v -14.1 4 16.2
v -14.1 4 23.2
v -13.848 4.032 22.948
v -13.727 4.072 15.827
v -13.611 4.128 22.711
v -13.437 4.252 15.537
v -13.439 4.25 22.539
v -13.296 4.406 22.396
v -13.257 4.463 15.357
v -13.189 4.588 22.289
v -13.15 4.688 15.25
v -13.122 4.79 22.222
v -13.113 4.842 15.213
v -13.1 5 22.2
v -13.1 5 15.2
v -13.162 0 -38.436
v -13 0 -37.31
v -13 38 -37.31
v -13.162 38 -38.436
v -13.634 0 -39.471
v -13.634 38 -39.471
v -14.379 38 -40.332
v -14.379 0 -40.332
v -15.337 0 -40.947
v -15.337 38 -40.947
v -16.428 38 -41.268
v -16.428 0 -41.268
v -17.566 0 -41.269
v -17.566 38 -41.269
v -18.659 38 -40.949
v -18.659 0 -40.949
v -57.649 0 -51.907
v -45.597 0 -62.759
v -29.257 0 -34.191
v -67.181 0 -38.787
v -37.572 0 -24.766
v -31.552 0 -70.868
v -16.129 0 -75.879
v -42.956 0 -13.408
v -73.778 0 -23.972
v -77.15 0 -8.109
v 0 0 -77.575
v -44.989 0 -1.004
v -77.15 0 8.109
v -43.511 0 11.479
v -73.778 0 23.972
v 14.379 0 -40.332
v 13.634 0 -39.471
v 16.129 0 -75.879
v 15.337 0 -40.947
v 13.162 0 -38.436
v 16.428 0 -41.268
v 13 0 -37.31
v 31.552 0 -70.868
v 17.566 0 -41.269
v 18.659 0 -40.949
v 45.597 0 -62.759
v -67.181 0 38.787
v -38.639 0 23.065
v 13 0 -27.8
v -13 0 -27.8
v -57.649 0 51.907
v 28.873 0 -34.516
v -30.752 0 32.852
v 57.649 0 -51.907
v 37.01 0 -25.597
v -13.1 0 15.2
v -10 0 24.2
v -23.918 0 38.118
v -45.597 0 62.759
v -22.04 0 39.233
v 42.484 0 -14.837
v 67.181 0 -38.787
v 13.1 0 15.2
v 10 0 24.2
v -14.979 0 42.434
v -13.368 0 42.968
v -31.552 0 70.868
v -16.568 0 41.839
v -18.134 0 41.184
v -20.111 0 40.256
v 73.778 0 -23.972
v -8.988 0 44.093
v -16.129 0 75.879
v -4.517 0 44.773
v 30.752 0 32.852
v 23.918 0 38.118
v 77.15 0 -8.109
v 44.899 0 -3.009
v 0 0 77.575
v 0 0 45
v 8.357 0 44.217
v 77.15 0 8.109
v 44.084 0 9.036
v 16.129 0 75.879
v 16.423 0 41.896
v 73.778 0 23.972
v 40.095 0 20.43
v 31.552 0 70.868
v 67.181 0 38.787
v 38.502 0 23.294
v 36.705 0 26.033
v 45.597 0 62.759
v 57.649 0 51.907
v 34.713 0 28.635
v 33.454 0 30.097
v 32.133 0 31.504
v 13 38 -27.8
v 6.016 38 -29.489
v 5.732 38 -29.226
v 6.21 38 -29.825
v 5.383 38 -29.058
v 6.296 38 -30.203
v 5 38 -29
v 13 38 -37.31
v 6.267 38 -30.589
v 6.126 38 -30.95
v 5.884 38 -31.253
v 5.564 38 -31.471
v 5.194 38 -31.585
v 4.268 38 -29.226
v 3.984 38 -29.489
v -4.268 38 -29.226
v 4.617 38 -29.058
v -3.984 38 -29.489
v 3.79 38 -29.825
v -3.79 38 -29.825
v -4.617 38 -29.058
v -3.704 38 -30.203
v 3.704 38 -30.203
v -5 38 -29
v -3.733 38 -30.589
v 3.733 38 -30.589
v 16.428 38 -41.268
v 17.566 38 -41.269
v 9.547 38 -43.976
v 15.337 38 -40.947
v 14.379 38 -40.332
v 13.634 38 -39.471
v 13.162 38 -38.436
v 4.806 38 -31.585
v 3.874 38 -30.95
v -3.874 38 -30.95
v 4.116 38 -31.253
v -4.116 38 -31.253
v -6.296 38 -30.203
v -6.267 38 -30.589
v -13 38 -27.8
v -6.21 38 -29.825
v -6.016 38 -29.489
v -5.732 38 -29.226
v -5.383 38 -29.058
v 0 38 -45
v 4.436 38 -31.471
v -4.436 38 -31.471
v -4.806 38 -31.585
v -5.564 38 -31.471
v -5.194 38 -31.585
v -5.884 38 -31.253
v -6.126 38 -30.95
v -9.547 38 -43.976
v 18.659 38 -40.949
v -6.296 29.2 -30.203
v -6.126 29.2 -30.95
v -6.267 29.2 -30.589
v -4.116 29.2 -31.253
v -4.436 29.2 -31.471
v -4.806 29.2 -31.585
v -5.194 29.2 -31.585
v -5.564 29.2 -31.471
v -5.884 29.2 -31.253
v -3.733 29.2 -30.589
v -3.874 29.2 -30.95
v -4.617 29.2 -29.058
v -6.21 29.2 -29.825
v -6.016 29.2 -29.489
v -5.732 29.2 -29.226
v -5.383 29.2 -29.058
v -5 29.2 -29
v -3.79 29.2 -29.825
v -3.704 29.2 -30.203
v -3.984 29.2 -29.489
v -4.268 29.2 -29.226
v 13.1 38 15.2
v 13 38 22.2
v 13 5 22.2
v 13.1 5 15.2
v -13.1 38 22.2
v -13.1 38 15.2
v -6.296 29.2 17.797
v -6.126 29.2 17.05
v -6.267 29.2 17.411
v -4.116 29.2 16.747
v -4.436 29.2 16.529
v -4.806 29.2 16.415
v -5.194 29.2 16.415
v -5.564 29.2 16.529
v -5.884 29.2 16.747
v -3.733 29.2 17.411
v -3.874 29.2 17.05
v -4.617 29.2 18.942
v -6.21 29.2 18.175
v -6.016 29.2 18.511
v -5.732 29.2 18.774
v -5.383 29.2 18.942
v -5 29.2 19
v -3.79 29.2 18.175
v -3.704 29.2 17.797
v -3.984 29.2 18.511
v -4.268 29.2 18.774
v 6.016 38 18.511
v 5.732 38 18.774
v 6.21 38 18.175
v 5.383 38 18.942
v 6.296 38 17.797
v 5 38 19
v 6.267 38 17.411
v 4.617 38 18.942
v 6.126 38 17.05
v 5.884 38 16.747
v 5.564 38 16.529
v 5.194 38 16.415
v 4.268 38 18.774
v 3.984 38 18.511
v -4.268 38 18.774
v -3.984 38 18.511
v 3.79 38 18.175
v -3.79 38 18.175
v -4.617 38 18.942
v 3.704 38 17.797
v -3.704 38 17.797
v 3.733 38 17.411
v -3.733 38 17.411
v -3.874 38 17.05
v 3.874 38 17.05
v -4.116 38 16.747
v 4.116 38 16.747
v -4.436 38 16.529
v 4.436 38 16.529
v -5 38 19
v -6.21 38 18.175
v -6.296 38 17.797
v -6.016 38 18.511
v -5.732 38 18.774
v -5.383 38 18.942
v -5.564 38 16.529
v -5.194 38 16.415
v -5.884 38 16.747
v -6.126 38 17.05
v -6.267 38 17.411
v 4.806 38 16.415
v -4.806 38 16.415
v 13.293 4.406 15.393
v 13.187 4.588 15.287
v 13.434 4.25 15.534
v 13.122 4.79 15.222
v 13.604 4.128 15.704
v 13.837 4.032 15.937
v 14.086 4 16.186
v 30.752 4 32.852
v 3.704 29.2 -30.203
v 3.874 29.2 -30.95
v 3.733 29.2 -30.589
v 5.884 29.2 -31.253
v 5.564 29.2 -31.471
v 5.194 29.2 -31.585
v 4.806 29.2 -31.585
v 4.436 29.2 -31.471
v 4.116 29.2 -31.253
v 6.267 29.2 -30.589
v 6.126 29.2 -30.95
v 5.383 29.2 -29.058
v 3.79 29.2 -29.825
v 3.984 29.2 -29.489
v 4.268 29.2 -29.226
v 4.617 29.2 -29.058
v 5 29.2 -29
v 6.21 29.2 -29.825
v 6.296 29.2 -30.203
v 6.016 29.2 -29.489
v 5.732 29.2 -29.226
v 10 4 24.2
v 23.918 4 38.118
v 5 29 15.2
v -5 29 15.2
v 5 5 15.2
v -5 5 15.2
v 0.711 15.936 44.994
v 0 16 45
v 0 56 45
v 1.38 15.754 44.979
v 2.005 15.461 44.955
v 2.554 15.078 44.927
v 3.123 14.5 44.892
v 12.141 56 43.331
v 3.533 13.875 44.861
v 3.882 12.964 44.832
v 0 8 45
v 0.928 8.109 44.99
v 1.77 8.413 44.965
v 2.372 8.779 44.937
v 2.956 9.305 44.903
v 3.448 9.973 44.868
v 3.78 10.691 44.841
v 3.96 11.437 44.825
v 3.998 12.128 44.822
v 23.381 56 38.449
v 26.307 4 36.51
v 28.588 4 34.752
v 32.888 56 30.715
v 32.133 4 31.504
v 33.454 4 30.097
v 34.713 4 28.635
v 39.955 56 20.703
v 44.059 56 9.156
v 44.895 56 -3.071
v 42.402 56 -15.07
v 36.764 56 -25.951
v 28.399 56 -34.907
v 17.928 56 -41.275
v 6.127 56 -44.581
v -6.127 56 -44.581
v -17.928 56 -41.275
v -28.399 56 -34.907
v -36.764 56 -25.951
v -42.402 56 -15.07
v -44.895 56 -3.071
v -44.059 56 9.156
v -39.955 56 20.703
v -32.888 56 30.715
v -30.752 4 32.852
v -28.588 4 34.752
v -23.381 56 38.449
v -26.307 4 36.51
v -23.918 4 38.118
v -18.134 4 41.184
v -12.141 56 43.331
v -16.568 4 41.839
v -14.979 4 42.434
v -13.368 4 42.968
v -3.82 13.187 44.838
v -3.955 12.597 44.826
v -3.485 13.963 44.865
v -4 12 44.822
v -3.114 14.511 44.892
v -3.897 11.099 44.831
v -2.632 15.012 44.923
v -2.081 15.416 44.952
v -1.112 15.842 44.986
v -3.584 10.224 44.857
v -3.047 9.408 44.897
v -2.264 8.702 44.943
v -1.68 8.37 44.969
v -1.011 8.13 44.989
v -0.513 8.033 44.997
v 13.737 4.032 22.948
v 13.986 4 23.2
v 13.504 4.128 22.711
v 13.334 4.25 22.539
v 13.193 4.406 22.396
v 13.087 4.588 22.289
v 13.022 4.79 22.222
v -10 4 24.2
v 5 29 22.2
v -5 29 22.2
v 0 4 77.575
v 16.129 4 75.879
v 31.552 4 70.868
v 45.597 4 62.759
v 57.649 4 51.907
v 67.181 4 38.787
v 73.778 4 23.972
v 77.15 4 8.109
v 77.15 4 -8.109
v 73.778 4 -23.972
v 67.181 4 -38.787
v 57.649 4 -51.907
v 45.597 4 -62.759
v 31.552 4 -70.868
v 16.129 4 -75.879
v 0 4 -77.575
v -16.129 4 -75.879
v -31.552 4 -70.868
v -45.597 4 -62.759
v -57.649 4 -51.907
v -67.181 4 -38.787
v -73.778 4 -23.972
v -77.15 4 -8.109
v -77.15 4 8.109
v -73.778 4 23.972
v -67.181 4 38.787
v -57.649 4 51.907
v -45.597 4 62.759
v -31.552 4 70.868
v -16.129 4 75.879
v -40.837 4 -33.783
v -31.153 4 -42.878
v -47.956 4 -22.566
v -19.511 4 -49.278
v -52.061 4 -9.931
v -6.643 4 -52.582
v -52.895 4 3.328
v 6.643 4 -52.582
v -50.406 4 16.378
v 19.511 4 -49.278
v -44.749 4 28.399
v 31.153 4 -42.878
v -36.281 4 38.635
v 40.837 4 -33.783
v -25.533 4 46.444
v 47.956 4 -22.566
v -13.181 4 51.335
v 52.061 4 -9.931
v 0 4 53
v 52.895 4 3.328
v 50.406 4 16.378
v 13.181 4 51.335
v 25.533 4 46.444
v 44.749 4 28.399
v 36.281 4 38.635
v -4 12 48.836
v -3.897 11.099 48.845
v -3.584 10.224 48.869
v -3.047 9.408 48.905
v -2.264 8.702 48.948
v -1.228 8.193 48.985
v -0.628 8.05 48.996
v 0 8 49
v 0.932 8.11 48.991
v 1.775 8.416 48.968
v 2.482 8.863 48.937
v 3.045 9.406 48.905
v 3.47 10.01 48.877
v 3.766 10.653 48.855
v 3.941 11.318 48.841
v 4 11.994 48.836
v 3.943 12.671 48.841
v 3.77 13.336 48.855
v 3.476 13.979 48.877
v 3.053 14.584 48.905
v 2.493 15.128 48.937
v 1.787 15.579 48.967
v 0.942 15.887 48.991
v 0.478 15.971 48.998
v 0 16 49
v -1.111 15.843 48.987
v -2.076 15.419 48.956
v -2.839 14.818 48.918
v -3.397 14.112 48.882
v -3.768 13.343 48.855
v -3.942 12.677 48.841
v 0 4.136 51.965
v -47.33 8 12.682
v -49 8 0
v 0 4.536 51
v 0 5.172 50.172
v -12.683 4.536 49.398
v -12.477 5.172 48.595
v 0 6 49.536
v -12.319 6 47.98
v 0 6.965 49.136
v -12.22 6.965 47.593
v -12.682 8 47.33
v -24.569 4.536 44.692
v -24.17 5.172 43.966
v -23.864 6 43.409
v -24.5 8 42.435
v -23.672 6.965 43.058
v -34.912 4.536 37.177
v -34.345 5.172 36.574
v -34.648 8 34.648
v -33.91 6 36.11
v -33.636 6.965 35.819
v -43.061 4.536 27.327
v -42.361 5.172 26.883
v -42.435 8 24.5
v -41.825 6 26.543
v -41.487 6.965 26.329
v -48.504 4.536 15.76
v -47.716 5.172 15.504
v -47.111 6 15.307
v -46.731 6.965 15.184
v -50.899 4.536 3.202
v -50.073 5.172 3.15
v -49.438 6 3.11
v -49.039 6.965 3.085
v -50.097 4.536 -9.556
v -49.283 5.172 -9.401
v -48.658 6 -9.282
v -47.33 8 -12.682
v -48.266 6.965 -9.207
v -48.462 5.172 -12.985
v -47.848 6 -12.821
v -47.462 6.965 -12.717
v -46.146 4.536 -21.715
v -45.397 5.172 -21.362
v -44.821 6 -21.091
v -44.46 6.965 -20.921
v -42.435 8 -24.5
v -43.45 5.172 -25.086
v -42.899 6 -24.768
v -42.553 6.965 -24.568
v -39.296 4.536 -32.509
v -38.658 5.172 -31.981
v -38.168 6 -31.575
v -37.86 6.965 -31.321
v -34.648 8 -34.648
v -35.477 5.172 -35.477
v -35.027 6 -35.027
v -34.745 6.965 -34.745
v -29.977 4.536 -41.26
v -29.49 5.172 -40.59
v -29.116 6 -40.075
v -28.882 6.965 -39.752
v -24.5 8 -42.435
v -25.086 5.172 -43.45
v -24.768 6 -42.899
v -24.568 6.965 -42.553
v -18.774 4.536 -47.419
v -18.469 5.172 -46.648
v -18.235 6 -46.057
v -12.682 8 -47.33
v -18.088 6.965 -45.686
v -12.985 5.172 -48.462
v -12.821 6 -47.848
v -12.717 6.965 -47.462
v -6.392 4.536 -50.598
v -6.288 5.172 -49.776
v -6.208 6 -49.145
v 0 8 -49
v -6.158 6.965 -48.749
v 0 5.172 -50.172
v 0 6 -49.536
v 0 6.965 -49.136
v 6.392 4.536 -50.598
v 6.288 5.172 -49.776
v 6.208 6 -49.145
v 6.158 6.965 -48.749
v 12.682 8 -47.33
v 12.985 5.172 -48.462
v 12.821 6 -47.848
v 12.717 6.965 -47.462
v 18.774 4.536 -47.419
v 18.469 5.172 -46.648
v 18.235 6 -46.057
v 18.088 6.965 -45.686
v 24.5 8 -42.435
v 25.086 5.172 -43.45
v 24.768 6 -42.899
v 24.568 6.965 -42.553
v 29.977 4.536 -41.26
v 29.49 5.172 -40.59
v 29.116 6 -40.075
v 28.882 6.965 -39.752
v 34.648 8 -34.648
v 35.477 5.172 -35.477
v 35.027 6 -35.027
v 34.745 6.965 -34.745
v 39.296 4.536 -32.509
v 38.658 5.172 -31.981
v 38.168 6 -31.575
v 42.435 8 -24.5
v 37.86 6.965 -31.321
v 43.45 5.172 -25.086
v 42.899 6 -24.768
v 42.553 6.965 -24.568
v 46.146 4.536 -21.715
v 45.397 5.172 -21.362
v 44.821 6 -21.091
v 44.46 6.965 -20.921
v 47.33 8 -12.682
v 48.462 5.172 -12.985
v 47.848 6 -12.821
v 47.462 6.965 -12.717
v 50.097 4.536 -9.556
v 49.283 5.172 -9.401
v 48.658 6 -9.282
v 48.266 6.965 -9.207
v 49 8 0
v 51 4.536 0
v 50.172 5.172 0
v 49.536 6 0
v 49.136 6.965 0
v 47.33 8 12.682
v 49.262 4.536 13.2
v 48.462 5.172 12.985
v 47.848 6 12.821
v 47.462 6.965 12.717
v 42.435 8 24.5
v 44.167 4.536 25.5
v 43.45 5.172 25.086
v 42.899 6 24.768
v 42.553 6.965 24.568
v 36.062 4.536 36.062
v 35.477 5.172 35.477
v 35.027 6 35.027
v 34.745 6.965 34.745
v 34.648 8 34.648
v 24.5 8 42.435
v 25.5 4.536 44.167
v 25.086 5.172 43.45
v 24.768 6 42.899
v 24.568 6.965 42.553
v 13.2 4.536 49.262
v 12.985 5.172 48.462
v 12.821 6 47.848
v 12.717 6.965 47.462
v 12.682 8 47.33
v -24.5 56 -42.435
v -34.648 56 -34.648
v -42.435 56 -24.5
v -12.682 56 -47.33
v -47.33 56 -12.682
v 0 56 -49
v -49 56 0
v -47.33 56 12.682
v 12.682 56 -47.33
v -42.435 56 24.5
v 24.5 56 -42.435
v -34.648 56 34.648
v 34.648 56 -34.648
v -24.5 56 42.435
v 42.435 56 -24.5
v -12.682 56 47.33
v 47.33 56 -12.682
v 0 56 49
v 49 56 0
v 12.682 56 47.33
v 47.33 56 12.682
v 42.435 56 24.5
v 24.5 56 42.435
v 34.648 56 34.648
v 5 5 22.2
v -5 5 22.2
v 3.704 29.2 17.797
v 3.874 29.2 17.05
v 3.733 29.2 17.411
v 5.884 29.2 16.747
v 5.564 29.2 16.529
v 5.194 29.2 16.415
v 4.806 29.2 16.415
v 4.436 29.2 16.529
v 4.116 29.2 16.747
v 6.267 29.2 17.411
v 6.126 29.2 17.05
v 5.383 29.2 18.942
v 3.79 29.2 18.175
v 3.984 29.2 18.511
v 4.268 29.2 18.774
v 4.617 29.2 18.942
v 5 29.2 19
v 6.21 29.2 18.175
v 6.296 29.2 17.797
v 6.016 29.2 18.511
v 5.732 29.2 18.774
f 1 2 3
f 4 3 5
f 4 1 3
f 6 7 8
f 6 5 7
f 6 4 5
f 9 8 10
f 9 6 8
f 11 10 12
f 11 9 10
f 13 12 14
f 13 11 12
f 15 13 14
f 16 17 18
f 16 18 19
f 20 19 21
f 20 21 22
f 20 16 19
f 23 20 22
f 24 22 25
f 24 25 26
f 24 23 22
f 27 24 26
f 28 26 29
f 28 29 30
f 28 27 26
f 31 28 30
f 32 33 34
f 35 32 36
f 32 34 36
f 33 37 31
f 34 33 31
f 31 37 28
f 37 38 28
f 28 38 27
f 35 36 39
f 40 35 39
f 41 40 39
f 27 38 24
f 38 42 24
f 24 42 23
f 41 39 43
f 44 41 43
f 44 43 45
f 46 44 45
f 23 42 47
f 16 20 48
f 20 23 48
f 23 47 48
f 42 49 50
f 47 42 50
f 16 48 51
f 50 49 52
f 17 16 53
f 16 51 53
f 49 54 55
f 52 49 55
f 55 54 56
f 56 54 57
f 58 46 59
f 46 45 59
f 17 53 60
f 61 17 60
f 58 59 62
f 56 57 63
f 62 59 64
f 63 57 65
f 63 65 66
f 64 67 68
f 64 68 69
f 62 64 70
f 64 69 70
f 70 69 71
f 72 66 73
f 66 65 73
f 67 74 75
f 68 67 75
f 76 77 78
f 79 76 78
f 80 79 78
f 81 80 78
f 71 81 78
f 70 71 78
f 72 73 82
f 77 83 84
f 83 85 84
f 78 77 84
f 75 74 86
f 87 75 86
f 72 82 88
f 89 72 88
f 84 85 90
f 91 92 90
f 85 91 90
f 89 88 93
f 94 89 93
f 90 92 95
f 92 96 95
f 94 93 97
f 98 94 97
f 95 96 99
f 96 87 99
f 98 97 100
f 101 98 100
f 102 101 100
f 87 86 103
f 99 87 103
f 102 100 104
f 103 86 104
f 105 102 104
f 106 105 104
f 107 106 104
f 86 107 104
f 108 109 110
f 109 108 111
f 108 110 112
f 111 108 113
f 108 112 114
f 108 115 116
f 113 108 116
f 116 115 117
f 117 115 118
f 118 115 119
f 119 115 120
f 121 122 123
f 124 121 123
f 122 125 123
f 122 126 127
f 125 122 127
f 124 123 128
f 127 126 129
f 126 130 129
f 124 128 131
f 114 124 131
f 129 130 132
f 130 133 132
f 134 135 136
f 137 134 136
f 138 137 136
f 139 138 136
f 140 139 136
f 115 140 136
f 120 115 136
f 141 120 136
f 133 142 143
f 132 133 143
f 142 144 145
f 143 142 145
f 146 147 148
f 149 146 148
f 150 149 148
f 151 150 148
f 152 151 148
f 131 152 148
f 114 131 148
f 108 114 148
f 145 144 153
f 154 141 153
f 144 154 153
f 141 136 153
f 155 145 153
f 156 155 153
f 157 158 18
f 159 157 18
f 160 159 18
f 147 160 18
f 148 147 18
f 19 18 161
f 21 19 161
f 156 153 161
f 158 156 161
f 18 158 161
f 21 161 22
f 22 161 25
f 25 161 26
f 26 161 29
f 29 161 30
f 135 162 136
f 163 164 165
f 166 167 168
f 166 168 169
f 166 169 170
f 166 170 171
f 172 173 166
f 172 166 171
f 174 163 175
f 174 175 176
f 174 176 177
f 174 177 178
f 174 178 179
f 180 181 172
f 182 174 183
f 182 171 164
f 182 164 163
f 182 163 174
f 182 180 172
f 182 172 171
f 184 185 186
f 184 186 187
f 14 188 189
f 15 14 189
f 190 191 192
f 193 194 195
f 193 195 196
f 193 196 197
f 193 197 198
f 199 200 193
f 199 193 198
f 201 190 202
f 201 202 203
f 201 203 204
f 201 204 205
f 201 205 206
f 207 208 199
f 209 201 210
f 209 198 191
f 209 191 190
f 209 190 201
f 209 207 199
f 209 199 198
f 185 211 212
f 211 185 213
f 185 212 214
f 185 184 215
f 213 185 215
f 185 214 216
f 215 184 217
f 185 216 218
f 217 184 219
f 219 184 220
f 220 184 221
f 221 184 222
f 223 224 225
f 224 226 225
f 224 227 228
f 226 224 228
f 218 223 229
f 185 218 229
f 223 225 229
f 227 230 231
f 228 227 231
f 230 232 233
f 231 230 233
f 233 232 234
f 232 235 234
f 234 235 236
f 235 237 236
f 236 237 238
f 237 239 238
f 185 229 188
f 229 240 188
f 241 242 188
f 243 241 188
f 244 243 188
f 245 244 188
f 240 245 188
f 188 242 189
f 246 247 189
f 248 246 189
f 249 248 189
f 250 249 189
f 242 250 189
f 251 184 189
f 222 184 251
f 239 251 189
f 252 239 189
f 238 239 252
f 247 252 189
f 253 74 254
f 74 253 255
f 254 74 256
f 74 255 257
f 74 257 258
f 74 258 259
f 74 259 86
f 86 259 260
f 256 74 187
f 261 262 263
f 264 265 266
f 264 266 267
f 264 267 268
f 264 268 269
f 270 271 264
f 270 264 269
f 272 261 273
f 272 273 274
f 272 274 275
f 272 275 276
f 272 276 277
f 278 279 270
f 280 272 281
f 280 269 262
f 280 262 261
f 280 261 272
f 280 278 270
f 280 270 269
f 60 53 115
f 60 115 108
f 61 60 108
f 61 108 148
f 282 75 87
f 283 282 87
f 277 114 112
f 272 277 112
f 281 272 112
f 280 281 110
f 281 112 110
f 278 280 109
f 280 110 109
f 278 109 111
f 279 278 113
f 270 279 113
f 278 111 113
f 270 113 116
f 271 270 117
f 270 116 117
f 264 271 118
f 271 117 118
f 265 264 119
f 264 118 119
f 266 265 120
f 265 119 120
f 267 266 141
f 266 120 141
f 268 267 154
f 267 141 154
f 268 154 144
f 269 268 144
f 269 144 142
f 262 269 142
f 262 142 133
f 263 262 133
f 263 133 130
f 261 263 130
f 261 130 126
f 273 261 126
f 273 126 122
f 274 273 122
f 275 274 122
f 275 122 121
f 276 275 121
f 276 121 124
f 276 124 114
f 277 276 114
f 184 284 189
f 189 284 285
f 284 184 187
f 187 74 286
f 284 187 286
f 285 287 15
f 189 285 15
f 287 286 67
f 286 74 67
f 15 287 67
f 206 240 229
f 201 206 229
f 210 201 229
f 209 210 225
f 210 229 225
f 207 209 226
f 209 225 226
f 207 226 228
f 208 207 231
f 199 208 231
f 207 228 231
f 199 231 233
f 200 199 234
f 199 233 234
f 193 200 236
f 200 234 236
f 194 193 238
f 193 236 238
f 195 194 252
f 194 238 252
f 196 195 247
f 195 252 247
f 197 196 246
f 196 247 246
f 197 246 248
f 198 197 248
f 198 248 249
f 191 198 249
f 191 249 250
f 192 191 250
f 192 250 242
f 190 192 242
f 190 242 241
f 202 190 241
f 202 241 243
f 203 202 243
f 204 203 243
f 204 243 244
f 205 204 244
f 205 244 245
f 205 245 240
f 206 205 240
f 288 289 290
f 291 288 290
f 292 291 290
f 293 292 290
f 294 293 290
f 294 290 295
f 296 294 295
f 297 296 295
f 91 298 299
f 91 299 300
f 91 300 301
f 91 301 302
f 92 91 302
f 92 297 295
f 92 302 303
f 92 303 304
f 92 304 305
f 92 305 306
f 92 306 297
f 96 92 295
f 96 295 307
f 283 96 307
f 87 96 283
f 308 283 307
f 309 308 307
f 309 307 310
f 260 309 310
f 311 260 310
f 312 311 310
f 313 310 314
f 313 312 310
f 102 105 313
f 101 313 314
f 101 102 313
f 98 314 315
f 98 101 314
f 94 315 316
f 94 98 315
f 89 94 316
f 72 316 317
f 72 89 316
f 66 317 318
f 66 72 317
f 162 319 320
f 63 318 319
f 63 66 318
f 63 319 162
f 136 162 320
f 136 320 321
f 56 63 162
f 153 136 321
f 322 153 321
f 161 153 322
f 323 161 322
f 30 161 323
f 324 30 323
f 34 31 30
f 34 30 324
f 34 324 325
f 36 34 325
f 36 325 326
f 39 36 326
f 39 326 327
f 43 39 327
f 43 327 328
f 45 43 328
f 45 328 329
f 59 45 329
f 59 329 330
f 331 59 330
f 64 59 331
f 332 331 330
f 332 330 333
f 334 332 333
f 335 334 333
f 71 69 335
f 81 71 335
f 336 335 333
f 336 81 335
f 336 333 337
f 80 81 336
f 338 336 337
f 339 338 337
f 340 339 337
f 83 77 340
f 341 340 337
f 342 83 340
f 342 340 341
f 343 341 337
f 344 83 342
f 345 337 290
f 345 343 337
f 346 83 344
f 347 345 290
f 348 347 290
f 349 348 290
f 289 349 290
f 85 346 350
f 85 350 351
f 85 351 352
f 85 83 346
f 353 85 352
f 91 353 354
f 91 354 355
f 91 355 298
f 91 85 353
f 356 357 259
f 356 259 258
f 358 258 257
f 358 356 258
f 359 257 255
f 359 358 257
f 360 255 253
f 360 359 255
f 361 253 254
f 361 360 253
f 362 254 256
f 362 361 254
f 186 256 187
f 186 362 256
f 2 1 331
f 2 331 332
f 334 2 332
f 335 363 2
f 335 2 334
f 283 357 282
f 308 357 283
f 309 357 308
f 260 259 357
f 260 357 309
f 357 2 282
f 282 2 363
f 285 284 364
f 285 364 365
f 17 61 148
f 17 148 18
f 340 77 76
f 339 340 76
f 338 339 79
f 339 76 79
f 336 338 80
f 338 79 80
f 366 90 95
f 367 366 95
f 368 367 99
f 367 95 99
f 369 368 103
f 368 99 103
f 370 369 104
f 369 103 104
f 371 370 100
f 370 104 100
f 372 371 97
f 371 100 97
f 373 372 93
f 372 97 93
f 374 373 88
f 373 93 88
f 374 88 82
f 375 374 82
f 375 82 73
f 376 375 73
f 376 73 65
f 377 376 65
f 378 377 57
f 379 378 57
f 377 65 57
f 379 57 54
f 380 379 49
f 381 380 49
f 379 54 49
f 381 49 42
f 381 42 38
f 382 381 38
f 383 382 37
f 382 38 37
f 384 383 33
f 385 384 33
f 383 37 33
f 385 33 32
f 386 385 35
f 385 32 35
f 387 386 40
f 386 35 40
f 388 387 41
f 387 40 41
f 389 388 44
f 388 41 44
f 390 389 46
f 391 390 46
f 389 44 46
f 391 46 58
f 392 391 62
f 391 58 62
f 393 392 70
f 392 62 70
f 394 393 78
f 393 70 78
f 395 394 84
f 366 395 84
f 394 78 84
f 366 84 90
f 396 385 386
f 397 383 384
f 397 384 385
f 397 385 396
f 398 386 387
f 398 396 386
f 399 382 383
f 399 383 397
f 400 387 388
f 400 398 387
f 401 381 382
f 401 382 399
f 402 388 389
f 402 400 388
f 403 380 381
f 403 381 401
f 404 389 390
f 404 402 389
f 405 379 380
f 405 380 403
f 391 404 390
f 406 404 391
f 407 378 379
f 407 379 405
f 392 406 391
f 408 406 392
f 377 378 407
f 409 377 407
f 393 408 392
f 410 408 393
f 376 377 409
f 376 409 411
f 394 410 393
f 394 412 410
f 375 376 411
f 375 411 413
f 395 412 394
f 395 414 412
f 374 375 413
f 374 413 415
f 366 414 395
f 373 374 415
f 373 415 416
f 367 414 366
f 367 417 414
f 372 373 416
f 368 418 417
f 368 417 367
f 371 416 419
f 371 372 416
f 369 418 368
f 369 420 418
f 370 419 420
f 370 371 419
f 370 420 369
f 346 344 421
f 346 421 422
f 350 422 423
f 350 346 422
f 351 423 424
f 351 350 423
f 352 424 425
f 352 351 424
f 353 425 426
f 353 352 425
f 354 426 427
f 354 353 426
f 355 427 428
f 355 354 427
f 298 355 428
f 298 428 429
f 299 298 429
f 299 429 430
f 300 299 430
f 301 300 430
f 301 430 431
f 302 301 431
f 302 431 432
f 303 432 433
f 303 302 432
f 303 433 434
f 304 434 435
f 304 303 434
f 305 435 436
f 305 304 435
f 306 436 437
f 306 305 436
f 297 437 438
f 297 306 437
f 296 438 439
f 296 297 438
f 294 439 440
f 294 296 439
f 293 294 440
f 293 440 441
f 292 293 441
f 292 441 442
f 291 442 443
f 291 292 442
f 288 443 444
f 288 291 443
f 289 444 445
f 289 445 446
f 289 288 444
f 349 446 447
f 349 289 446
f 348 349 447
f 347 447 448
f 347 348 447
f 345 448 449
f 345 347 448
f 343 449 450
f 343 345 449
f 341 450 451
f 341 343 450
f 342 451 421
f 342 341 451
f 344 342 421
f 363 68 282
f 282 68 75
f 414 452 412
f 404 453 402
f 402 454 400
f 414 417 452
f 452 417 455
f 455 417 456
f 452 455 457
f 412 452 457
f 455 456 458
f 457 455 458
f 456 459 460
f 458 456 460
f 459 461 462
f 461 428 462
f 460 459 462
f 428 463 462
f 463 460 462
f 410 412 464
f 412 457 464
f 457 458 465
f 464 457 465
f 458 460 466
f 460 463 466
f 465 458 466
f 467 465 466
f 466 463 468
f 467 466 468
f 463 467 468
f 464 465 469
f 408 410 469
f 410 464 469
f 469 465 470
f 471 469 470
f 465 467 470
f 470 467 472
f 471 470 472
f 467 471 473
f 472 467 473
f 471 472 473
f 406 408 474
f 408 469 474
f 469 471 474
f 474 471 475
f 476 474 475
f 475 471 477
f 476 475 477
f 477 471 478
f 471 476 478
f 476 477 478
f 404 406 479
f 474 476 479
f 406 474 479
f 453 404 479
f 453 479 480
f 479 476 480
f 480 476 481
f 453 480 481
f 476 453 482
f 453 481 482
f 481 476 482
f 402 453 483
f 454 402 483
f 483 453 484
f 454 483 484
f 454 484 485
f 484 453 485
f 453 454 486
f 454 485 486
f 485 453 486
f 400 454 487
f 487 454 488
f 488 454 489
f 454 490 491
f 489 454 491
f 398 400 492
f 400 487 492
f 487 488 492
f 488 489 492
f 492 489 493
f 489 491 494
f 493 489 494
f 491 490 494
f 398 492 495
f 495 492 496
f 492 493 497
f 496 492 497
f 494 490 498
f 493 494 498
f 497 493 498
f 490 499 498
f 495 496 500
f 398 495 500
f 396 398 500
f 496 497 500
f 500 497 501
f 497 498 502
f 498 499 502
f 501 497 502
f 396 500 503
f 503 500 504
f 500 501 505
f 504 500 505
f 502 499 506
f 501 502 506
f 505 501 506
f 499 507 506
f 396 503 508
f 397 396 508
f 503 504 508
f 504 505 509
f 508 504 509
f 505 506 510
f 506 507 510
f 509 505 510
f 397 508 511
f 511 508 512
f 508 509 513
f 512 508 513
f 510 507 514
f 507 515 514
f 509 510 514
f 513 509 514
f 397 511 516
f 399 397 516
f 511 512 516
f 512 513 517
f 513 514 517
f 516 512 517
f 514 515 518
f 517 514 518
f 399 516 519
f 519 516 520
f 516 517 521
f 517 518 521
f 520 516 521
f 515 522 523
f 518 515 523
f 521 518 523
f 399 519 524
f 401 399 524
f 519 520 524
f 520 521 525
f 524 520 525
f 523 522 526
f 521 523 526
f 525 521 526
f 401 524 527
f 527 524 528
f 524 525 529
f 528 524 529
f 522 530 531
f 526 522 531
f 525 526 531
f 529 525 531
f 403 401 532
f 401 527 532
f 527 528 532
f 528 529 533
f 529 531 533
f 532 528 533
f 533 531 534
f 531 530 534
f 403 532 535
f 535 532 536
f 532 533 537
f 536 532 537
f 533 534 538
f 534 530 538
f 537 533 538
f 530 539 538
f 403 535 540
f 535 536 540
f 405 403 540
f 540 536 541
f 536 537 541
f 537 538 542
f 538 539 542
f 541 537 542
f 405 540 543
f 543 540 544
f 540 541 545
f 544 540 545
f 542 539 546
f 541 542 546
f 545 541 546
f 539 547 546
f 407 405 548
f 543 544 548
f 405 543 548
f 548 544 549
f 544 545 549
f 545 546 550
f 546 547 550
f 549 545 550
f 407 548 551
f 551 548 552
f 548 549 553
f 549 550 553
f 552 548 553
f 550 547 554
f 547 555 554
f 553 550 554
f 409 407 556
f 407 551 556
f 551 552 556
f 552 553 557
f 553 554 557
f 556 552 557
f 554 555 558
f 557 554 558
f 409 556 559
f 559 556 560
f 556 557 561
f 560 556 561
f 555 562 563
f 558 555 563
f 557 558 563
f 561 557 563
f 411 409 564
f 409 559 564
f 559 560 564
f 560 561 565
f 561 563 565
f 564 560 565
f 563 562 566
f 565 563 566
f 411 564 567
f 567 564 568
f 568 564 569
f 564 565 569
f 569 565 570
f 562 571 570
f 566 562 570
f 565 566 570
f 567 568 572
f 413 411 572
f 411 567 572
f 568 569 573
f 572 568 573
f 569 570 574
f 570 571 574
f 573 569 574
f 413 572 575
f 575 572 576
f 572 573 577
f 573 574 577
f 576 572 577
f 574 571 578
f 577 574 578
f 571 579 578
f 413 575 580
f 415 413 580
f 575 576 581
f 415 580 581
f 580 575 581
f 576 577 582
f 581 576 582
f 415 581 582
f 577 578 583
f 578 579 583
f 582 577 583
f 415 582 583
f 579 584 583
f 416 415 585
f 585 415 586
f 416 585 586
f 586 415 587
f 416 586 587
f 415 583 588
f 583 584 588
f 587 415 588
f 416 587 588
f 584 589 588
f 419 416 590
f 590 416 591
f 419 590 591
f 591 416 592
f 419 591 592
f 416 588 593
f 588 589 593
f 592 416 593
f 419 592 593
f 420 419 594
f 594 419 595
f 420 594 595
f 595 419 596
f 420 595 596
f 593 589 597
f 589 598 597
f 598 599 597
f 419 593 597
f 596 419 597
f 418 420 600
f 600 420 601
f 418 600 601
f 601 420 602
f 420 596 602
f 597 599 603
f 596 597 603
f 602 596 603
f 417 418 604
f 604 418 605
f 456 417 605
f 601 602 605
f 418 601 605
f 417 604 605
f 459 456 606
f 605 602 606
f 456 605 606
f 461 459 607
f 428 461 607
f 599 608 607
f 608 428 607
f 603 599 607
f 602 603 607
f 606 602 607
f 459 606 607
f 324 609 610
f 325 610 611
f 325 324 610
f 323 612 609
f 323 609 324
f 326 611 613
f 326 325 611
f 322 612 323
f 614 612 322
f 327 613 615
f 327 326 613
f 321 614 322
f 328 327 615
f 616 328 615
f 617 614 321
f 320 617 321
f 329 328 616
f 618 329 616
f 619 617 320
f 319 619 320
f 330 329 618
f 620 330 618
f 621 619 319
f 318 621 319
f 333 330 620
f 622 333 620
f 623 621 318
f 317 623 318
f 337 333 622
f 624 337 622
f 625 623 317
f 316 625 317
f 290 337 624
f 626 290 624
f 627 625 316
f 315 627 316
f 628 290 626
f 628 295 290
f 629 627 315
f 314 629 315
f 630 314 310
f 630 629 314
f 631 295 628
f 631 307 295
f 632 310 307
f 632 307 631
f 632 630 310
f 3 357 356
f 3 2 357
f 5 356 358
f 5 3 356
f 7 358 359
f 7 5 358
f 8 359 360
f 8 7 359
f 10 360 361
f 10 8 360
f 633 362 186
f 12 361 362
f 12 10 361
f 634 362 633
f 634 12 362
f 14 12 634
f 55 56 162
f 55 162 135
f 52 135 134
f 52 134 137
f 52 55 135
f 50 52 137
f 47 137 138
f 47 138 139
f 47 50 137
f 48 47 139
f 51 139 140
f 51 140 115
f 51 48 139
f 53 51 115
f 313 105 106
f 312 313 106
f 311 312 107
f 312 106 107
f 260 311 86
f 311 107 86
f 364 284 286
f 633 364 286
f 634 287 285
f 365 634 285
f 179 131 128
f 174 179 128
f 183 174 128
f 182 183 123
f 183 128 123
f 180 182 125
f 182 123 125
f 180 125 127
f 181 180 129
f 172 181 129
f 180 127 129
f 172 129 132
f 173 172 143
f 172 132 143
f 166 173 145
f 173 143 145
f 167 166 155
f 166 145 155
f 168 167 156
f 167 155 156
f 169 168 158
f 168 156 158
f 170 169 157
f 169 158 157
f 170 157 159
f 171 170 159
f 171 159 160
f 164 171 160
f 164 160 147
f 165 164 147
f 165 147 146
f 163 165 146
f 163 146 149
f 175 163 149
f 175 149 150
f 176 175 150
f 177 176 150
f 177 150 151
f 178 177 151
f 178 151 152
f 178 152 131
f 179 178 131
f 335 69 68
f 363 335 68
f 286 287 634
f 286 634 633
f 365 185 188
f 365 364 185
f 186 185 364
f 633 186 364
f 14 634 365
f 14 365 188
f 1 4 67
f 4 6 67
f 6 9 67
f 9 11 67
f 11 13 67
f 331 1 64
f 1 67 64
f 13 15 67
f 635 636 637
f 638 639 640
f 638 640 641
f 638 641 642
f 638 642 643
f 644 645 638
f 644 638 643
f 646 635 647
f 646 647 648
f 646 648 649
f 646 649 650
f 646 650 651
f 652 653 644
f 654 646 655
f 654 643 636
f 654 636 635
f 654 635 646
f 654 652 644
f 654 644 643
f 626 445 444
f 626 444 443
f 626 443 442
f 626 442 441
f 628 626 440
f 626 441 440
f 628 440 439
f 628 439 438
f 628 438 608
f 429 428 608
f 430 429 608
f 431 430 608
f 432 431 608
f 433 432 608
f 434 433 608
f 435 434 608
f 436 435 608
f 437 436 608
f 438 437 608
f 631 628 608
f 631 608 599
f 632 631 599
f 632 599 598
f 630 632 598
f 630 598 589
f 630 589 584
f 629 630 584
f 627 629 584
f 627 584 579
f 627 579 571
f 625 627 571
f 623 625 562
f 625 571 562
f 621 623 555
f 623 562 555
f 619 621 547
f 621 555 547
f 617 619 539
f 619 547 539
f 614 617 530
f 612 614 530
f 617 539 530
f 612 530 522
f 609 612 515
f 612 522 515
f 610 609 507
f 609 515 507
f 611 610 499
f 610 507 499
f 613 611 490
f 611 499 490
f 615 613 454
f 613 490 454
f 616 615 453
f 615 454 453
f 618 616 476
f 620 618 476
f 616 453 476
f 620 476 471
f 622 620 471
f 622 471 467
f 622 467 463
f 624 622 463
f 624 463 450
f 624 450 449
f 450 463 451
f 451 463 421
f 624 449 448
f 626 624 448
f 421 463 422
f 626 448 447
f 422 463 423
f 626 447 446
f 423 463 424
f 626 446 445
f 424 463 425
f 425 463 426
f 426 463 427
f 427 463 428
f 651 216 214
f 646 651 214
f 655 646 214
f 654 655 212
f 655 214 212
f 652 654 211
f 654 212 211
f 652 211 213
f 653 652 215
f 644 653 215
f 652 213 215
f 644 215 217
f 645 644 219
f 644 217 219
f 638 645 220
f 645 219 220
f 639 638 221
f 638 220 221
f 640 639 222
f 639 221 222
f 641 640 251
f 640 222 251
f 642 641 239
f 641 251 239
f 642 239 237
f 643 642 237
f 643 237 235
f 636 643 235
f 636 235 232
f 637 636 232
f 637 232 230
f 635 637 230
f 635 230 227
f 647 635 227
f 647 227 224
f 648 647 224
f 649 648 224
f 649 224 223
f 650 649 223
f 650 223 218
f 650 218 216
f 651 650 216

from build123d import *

# Parameters (mm, degrees)
CROQUIS3_R              = 49
CROQUIS3_R_2            = 45
SALIENTE_EXTRUIR1_DEPTH = 56
CROQUIS1_R              = 77.574507489
SALIENTE_EXTRUIR2_DEPTH = 4
SALIENTE_EXTRUIR3_DEPTH = 38
CORTAR_EXTRUIR1_DEPTH   = 8
CROQUIS7_R              = 4
CORTAR_EXTRUIR2_DEPTH   = 42
REDONDEO1_R             = 4
REDONDEO2_R             = 1
CROQUIS8_R              = 1.3
CORTAR_EXTRUIR3_DEPTH   = 30.8


with BuildPart() as part:
    # Croquis3 → Saliente-Extruir1 (new body)
    with BuildSketch(Plane(origin=(0, 0, 0), x_dir=(1, 0, 0), z_dir=(0, 1, 0))):
        with Locations(Location((0, 0, 0), (0, 0, 270))):
            Circle(CROQUIS3_R)
        with Locations(Location((0, 0, 0), (0, 0, 270))):
            Circle(CROQUIS3_R_2, mode=Mode.SUBTRACT)
    extrude(amount=SALIENTE_EXTRUIR1_DEPTH)

    # Croquis1 → Saliente-Extruir2 (add)
    with BuildSketch(Plane(origin=(0, 0, 0), x_dir=(1, 0, 0), z_dir=(0, 1, 0))):
        with Locations(Location((0, 0, 0), (0, 0, 270))):
            Circle(CROQUIS1_R)
        with BuildLine():
            Line((-23.917575663, -38.117575663), (-10, -24.2))
            Line((-10, -24.2), (0, -24.2))
            Line((0, -24.2), (10, -24.2))
            Line((10, -24.2), (23.917575663, -38.117575663))
            ThreePointArc((23.917575663, -38.117575663), (12.444056717, -43.245178372), (0, -45))
            ThreePointArc((0, -45), (-6.760954384, -44.489206509), (-13.368422036, -42.968422036))
            ThreePointArc((-13.368422036, -42.968422036), (-15.776603613, -42.143786949), (-18.134305032, -41.184305032))
            ThreePointArc((-18.134305032, -41.184305032), (-21.081778264, -39.756240079), (-23.917575663, -38.117575663))
        make_face(mode=Mode.SUBTRACT)
        with BuildLine():
            Line((13.1, -15.2), (0, -15.2))
            Line((0, -15.2), (-13.1, -15.2))
            Line((-13.1, -15.2), (-30.752476319, -32.852476319))
            ThreePointArc((-30.752476319, -32.852476319), (-7.771708829, 44.323814613), (40.095012748, -20.430123659))
            ThreePointArc((40.095012748, -20.430123659), (37.628495356, -24.679877173), (34.713332708, -28.635372048))
            ThreePointArc((34.713332708, -28.635372048), (32.8007474, -30.807644668), (30.752476319, -32.852476319))
            Line((30.752476319, -32.852476319), (13.1, -15.2))
        make_face(mode=Mode.SUBTRACT)
    extrude(amount=SALIENTE_EXTRUIR2_DEPTH)

    # Croquis5 → Saliente-Extruir3 (add)
    with BuildSketch(Plane(origin=(0, 0, 0), x_dir=(1, 0, 0), z_dir=(0, 1, 0))):
        with BuildLine():
            ThreePointArc((18.658536585, 40.949469014), (14.835992877, 40.673601998), (13, 37.309516212))
            Line((13, 37.309516212), (13, 27.8))
            Line((13, 27.8), (0, 27.8))
            Line((0, 27.8), (-13, 27.8))
            Line((-13, 27.8), (-13, 37.309516212))
            ThreePointArc((-13, 37.309516212), (-14.835992877, 40.673601998), (-18.658536585, 40.949469014))
            ThreePointArc((-18.658536585, 40.949469014), (0, 45), (18.658536585, 40.949469014))
        make_face()
        Polygon((-13.1, -15.2), (13.1, -15.2), (13, -22.2), (-13.1, -22.2), align=None)
    extrude(amount=SALIENTE_EXTRUIR3_DEPTH)

    # Croquis6 → Cortar-Extruir1 (cut)
    with BuildSketch(Plane.XY.offset(15)):
        Polygon((5, 5), (0, 5), (-5, 5), (-5, 29), (-2.492829293, 29), (5, 29), align=None)
    extrude(amount=CORTAR_EXTRUIR1_DEPTH, mode=Mode.SUBTRACT)

    # Croquis7 → Cortar-Extruir2 (cut)
    with BuildSketch(Plane.XY.offset(15)):
        with Locations(Location((0, 12, 0), (0, 0, 180))):
            Circle(CROQUIS7_R)
    extrude(amount=CORTAR_EXTRUIR2_DEPTH, mode=Mode.SUBTRACT)

    # Redondeo1
    redondeo1_edges = [part.edges().sort_by_distance(p)[0] for p in [
        (0, 4, -49),
    ]]
    fillet(redondeo1_edges, radius=REDONDEO1_R)

    # Redondeo2
    # the kernel refuses this fillet: 1 mm, written as the material it adds along each edge
    with BuildSketch(Plane(origin=(-13.1, 4, 22.2), x_dir=(0, 0, 1), z_dir=(1, 0, 0))) as redondeo2_piece_1_section:
        with BuildLine():
            CenterArc((REDONDEO2_R, -REDONDEO2_R), REDONDEO2_R, 90, 90)
            Line((0, -REDONDEO2_R), (0, 0))
            Line((0, 0), (REDONDEO2_R, 0))
        make_face()
    redondeo2_piece_1 = extrude(amount=28.6, mode=Mode.PRIVATE)
    redondeo2_piece_1 = split(redondeo2_piece_1, bisect_by=Plane(origin=(12.992267362, 4.226395114, 22.741284648), z_dir=(-0.99989797479951, 0, -0.014284256782850096)), keep=Keep.TOP, mode=Mode.PRIVATE)
    add(redondeo2_piece_1)
    with BuildSketch(Plane(origin=(12.964289358, 4, 24.699744937), x_dir=(0.99989797479951, 0, 0.014284256782850096), z_dir=(0.014284256782850096, 0, -0.99989797479951))) as redondeo2_piece_2_section:
        with BuildLine():
            CenterArc((REDONDEO2_R, -REDONDEO2_R), REDONDEO2_R, 90, 90)
            Line((0, -REDONDEO2_R), (0, 0))
            Line((0, 0), (REDONDEO2_R, 0))
        make_face()
    redondeo2_piece_2 = extrude(amount=12.000714249, mode=Mode.PRIVATE)
    redondeo2_piece_2 = split(redondeo2_piece_2, bisect_by=Plane(origin=(14.988415496, 4.230359827, 17.088415496), z_dir=(-0.7071067811865411, 0, 0.7071067811865539)), keep=Keep.TOP, mode=Mode.PRIVATE)
    redondeo2_piece_2 = split(redondeo2_piece_2, bisect_by=Plane(origin=(13.268129446, 4.230359827, 15.2), z_dir=(0, 0, 1)), keep=Keep.TOP, mode=Mode.PRIVATE)
    redondeo2_piece_2 = split(redondeo2_piece_2, bisect_by=Plane(origin=(13.268129446, 4.230359827, 22.2), z_dir=(0, 0, -1)), keep=Keep.TOP, mode=Mode.PRIVATE)
    add(redondeo2_piece_2)
    with BuildSketch(Plane(origin=(-13.1, 4, 15.2), x_dir=(-1, 0, 0), z_dir=(0, 0, 1))) as redondeo2_piece_3_section:
        with BuildLine():
            CenterArc((REDONDEO2_R, -REDONDEO2_R), REDONDEO2_R, 90, 90)
            Line((0, -REDONDEO2_R), (0, 0))
            Line((0, 0), (REDONDEO2_R, 0))
        make_face()
    redondeo2_piece_3 = extrude(amount=7, mode=Mode.PRIVATE)
    redondeo2_piece_3 = split(redondeo2_piece_3, bisect_by=Plane(origin=(-15.014877598, 4.230417942, 17.114877598), z_dir=(0.7071067811865538, 0, 0.7071067811865414)), keep=Keep.TOP, mode=Mode.PRIVATE)
    add(redondeo2_piece_3)
    with BuildSketch(Plane(origin=(-13.1, 4, 15.2), x_dir=(-1, 0, 0), z_dir=(0, 0, 1))) as redondeo2_piece_4a_section:
        with BuildLine():
            CenterArc((REDONDEO2_R, -REDONDEO2_R), REDONDEO2_R, 90, 90)
            Line((0, -REDONDEO2_R), (0, 0))
            Line((0, 0), (REDONDEO2_R, 0))
        make_face()
    redondeo2_piece_4a = extrude(amount=9.5, mode=Mode.PRIVATE)
    redondeo2_piece_4a = split(redondeo2_piece_4a, bisect_by=Plane(origin=(-13.326395114, 4.226395114, 22.2), z_dir=(0, 0, 1)), keep=Keep.TOP, mode=Mode.PRIVATE)
    with BuildSketch(Plane(origin=(-15.6, 4, 22.2), x_dir=(0, 0, 1), z_dir=(1, 0, 0))) as redondeo2_piece_4b_section:
        with BuildLine():
            CenterArc((REDONDEO2_R, -REDONDEO2_R), REDONDEO2_R, 90, 90)
            Line((0, -REDONDEO2_R), (0, 0))
            Line((0, 0), (REDONDEO2_R, 0))
        make_face()
    redondeo2_piece_4b = extrude(amount=31.1, mode=Mode.PRIVATE)
    redondeo2_piece_4b = split(redondeo2_piece_4b, bisect_by=Plane(origin=(-13.1, 4.226395114, 22.426395114), z_dir=(-1, 0, 0)), keep=Keep.TOP, mode=Mode.PRIVATE)
    redondeo2_piece_4 = redondeo2_piece_4a & redondeo2_piece_4b
    add(redondeo2_piece_4)
    with BuildSketch(Plane(origin=(-13.1, 4, 22.2), x_dir=(0, 0, 1), z_dir=(1, 0, 0))) as redondeo2_piece_5a_section:
        with BuildLine():
            CenterArc((REDONDEO2_R, -REDONDEO2_R), REDONDEO2_R, 90, 90)
            Line((0, -REDONDEO2_R), (0, 0))
            Line((0, 0), (REDONDEO2_R, 0))
        make_face()
    redondeo2_piece_5a = extrude(amount=28.6, mode=Mode.PRIVATE)
    redondeo2_piece_5a = split(redondeo2_piece_5a, bisect_by=Plane(origin=(12.997017375, 4.226238422, 22.408783729), z_dir=(0.99989797479951, 0, 0.014284256782850096)), keep=Keep.TOP, mode=Mode.PRIVATE)
    with BuildSketch(Plane(origin=(12.964289358, 4, 24.699744937), x_dir=(0.99989797479951, 0, 0.014284256782850096), z_dir=(0.014284256782850096, 0, -0.99989797479951))) as redondeo2_piece_5b_section:
        with BuildLine():
            CenterArc((REDONDEO2_R, -REDONDEO2_R), REDONDEO2_R, 90, 90)
            Line((0, -REDONDEO2_R), (0, 0))
            Line((0, 0), (REDONDEO2_R, 0))
        make_face()
    redondeo2_piece_5b = extrude(amount=12.000714249, mode=Mode.PRIVATE)
    redondeo2_piece_5b = split(redondeo2_piece_5b, bisect_by=Plane(origin=(13.208805032, 4.226238422, 22.2), z_dir=(0, 0, 1)), keep=Keep.TOP, mode=Mode.PRIVATE)
    redondeo2_piece_5 = redondeo2_piece_5a & redondeo2_piece_5b
    add(redondeo2_piece_5)

    # Croquis8 → Cortar-Extruir3 (cut)
    with BuildSketch(Plane(origin=(0, 60, 0), x_dir=(1, 0, 0), z_dir=(0, 1, 0))):
        with Locations(Location((-5, -17.7, 0), (0, 0, 270))):
            Circle(CROQUIS8_R)
        with Locations(Location((5, -17.7, 0), (0, 0, 270))):
            Circle(CROQUIS8_R)
        with Locations(Location((5, 30.3, 0), (0, 0, 270))):
            Circle(CROQUIS8_R)
        with Locations(Location((-5, 30.3, 0), (0, 0, 270))):
            Circle(CROQUIS8_R)
    extrude(amount=-CORTAR_EXTRUIR3_DEPTH, mode=Mode.SUBTRACT)


solid = part.part
